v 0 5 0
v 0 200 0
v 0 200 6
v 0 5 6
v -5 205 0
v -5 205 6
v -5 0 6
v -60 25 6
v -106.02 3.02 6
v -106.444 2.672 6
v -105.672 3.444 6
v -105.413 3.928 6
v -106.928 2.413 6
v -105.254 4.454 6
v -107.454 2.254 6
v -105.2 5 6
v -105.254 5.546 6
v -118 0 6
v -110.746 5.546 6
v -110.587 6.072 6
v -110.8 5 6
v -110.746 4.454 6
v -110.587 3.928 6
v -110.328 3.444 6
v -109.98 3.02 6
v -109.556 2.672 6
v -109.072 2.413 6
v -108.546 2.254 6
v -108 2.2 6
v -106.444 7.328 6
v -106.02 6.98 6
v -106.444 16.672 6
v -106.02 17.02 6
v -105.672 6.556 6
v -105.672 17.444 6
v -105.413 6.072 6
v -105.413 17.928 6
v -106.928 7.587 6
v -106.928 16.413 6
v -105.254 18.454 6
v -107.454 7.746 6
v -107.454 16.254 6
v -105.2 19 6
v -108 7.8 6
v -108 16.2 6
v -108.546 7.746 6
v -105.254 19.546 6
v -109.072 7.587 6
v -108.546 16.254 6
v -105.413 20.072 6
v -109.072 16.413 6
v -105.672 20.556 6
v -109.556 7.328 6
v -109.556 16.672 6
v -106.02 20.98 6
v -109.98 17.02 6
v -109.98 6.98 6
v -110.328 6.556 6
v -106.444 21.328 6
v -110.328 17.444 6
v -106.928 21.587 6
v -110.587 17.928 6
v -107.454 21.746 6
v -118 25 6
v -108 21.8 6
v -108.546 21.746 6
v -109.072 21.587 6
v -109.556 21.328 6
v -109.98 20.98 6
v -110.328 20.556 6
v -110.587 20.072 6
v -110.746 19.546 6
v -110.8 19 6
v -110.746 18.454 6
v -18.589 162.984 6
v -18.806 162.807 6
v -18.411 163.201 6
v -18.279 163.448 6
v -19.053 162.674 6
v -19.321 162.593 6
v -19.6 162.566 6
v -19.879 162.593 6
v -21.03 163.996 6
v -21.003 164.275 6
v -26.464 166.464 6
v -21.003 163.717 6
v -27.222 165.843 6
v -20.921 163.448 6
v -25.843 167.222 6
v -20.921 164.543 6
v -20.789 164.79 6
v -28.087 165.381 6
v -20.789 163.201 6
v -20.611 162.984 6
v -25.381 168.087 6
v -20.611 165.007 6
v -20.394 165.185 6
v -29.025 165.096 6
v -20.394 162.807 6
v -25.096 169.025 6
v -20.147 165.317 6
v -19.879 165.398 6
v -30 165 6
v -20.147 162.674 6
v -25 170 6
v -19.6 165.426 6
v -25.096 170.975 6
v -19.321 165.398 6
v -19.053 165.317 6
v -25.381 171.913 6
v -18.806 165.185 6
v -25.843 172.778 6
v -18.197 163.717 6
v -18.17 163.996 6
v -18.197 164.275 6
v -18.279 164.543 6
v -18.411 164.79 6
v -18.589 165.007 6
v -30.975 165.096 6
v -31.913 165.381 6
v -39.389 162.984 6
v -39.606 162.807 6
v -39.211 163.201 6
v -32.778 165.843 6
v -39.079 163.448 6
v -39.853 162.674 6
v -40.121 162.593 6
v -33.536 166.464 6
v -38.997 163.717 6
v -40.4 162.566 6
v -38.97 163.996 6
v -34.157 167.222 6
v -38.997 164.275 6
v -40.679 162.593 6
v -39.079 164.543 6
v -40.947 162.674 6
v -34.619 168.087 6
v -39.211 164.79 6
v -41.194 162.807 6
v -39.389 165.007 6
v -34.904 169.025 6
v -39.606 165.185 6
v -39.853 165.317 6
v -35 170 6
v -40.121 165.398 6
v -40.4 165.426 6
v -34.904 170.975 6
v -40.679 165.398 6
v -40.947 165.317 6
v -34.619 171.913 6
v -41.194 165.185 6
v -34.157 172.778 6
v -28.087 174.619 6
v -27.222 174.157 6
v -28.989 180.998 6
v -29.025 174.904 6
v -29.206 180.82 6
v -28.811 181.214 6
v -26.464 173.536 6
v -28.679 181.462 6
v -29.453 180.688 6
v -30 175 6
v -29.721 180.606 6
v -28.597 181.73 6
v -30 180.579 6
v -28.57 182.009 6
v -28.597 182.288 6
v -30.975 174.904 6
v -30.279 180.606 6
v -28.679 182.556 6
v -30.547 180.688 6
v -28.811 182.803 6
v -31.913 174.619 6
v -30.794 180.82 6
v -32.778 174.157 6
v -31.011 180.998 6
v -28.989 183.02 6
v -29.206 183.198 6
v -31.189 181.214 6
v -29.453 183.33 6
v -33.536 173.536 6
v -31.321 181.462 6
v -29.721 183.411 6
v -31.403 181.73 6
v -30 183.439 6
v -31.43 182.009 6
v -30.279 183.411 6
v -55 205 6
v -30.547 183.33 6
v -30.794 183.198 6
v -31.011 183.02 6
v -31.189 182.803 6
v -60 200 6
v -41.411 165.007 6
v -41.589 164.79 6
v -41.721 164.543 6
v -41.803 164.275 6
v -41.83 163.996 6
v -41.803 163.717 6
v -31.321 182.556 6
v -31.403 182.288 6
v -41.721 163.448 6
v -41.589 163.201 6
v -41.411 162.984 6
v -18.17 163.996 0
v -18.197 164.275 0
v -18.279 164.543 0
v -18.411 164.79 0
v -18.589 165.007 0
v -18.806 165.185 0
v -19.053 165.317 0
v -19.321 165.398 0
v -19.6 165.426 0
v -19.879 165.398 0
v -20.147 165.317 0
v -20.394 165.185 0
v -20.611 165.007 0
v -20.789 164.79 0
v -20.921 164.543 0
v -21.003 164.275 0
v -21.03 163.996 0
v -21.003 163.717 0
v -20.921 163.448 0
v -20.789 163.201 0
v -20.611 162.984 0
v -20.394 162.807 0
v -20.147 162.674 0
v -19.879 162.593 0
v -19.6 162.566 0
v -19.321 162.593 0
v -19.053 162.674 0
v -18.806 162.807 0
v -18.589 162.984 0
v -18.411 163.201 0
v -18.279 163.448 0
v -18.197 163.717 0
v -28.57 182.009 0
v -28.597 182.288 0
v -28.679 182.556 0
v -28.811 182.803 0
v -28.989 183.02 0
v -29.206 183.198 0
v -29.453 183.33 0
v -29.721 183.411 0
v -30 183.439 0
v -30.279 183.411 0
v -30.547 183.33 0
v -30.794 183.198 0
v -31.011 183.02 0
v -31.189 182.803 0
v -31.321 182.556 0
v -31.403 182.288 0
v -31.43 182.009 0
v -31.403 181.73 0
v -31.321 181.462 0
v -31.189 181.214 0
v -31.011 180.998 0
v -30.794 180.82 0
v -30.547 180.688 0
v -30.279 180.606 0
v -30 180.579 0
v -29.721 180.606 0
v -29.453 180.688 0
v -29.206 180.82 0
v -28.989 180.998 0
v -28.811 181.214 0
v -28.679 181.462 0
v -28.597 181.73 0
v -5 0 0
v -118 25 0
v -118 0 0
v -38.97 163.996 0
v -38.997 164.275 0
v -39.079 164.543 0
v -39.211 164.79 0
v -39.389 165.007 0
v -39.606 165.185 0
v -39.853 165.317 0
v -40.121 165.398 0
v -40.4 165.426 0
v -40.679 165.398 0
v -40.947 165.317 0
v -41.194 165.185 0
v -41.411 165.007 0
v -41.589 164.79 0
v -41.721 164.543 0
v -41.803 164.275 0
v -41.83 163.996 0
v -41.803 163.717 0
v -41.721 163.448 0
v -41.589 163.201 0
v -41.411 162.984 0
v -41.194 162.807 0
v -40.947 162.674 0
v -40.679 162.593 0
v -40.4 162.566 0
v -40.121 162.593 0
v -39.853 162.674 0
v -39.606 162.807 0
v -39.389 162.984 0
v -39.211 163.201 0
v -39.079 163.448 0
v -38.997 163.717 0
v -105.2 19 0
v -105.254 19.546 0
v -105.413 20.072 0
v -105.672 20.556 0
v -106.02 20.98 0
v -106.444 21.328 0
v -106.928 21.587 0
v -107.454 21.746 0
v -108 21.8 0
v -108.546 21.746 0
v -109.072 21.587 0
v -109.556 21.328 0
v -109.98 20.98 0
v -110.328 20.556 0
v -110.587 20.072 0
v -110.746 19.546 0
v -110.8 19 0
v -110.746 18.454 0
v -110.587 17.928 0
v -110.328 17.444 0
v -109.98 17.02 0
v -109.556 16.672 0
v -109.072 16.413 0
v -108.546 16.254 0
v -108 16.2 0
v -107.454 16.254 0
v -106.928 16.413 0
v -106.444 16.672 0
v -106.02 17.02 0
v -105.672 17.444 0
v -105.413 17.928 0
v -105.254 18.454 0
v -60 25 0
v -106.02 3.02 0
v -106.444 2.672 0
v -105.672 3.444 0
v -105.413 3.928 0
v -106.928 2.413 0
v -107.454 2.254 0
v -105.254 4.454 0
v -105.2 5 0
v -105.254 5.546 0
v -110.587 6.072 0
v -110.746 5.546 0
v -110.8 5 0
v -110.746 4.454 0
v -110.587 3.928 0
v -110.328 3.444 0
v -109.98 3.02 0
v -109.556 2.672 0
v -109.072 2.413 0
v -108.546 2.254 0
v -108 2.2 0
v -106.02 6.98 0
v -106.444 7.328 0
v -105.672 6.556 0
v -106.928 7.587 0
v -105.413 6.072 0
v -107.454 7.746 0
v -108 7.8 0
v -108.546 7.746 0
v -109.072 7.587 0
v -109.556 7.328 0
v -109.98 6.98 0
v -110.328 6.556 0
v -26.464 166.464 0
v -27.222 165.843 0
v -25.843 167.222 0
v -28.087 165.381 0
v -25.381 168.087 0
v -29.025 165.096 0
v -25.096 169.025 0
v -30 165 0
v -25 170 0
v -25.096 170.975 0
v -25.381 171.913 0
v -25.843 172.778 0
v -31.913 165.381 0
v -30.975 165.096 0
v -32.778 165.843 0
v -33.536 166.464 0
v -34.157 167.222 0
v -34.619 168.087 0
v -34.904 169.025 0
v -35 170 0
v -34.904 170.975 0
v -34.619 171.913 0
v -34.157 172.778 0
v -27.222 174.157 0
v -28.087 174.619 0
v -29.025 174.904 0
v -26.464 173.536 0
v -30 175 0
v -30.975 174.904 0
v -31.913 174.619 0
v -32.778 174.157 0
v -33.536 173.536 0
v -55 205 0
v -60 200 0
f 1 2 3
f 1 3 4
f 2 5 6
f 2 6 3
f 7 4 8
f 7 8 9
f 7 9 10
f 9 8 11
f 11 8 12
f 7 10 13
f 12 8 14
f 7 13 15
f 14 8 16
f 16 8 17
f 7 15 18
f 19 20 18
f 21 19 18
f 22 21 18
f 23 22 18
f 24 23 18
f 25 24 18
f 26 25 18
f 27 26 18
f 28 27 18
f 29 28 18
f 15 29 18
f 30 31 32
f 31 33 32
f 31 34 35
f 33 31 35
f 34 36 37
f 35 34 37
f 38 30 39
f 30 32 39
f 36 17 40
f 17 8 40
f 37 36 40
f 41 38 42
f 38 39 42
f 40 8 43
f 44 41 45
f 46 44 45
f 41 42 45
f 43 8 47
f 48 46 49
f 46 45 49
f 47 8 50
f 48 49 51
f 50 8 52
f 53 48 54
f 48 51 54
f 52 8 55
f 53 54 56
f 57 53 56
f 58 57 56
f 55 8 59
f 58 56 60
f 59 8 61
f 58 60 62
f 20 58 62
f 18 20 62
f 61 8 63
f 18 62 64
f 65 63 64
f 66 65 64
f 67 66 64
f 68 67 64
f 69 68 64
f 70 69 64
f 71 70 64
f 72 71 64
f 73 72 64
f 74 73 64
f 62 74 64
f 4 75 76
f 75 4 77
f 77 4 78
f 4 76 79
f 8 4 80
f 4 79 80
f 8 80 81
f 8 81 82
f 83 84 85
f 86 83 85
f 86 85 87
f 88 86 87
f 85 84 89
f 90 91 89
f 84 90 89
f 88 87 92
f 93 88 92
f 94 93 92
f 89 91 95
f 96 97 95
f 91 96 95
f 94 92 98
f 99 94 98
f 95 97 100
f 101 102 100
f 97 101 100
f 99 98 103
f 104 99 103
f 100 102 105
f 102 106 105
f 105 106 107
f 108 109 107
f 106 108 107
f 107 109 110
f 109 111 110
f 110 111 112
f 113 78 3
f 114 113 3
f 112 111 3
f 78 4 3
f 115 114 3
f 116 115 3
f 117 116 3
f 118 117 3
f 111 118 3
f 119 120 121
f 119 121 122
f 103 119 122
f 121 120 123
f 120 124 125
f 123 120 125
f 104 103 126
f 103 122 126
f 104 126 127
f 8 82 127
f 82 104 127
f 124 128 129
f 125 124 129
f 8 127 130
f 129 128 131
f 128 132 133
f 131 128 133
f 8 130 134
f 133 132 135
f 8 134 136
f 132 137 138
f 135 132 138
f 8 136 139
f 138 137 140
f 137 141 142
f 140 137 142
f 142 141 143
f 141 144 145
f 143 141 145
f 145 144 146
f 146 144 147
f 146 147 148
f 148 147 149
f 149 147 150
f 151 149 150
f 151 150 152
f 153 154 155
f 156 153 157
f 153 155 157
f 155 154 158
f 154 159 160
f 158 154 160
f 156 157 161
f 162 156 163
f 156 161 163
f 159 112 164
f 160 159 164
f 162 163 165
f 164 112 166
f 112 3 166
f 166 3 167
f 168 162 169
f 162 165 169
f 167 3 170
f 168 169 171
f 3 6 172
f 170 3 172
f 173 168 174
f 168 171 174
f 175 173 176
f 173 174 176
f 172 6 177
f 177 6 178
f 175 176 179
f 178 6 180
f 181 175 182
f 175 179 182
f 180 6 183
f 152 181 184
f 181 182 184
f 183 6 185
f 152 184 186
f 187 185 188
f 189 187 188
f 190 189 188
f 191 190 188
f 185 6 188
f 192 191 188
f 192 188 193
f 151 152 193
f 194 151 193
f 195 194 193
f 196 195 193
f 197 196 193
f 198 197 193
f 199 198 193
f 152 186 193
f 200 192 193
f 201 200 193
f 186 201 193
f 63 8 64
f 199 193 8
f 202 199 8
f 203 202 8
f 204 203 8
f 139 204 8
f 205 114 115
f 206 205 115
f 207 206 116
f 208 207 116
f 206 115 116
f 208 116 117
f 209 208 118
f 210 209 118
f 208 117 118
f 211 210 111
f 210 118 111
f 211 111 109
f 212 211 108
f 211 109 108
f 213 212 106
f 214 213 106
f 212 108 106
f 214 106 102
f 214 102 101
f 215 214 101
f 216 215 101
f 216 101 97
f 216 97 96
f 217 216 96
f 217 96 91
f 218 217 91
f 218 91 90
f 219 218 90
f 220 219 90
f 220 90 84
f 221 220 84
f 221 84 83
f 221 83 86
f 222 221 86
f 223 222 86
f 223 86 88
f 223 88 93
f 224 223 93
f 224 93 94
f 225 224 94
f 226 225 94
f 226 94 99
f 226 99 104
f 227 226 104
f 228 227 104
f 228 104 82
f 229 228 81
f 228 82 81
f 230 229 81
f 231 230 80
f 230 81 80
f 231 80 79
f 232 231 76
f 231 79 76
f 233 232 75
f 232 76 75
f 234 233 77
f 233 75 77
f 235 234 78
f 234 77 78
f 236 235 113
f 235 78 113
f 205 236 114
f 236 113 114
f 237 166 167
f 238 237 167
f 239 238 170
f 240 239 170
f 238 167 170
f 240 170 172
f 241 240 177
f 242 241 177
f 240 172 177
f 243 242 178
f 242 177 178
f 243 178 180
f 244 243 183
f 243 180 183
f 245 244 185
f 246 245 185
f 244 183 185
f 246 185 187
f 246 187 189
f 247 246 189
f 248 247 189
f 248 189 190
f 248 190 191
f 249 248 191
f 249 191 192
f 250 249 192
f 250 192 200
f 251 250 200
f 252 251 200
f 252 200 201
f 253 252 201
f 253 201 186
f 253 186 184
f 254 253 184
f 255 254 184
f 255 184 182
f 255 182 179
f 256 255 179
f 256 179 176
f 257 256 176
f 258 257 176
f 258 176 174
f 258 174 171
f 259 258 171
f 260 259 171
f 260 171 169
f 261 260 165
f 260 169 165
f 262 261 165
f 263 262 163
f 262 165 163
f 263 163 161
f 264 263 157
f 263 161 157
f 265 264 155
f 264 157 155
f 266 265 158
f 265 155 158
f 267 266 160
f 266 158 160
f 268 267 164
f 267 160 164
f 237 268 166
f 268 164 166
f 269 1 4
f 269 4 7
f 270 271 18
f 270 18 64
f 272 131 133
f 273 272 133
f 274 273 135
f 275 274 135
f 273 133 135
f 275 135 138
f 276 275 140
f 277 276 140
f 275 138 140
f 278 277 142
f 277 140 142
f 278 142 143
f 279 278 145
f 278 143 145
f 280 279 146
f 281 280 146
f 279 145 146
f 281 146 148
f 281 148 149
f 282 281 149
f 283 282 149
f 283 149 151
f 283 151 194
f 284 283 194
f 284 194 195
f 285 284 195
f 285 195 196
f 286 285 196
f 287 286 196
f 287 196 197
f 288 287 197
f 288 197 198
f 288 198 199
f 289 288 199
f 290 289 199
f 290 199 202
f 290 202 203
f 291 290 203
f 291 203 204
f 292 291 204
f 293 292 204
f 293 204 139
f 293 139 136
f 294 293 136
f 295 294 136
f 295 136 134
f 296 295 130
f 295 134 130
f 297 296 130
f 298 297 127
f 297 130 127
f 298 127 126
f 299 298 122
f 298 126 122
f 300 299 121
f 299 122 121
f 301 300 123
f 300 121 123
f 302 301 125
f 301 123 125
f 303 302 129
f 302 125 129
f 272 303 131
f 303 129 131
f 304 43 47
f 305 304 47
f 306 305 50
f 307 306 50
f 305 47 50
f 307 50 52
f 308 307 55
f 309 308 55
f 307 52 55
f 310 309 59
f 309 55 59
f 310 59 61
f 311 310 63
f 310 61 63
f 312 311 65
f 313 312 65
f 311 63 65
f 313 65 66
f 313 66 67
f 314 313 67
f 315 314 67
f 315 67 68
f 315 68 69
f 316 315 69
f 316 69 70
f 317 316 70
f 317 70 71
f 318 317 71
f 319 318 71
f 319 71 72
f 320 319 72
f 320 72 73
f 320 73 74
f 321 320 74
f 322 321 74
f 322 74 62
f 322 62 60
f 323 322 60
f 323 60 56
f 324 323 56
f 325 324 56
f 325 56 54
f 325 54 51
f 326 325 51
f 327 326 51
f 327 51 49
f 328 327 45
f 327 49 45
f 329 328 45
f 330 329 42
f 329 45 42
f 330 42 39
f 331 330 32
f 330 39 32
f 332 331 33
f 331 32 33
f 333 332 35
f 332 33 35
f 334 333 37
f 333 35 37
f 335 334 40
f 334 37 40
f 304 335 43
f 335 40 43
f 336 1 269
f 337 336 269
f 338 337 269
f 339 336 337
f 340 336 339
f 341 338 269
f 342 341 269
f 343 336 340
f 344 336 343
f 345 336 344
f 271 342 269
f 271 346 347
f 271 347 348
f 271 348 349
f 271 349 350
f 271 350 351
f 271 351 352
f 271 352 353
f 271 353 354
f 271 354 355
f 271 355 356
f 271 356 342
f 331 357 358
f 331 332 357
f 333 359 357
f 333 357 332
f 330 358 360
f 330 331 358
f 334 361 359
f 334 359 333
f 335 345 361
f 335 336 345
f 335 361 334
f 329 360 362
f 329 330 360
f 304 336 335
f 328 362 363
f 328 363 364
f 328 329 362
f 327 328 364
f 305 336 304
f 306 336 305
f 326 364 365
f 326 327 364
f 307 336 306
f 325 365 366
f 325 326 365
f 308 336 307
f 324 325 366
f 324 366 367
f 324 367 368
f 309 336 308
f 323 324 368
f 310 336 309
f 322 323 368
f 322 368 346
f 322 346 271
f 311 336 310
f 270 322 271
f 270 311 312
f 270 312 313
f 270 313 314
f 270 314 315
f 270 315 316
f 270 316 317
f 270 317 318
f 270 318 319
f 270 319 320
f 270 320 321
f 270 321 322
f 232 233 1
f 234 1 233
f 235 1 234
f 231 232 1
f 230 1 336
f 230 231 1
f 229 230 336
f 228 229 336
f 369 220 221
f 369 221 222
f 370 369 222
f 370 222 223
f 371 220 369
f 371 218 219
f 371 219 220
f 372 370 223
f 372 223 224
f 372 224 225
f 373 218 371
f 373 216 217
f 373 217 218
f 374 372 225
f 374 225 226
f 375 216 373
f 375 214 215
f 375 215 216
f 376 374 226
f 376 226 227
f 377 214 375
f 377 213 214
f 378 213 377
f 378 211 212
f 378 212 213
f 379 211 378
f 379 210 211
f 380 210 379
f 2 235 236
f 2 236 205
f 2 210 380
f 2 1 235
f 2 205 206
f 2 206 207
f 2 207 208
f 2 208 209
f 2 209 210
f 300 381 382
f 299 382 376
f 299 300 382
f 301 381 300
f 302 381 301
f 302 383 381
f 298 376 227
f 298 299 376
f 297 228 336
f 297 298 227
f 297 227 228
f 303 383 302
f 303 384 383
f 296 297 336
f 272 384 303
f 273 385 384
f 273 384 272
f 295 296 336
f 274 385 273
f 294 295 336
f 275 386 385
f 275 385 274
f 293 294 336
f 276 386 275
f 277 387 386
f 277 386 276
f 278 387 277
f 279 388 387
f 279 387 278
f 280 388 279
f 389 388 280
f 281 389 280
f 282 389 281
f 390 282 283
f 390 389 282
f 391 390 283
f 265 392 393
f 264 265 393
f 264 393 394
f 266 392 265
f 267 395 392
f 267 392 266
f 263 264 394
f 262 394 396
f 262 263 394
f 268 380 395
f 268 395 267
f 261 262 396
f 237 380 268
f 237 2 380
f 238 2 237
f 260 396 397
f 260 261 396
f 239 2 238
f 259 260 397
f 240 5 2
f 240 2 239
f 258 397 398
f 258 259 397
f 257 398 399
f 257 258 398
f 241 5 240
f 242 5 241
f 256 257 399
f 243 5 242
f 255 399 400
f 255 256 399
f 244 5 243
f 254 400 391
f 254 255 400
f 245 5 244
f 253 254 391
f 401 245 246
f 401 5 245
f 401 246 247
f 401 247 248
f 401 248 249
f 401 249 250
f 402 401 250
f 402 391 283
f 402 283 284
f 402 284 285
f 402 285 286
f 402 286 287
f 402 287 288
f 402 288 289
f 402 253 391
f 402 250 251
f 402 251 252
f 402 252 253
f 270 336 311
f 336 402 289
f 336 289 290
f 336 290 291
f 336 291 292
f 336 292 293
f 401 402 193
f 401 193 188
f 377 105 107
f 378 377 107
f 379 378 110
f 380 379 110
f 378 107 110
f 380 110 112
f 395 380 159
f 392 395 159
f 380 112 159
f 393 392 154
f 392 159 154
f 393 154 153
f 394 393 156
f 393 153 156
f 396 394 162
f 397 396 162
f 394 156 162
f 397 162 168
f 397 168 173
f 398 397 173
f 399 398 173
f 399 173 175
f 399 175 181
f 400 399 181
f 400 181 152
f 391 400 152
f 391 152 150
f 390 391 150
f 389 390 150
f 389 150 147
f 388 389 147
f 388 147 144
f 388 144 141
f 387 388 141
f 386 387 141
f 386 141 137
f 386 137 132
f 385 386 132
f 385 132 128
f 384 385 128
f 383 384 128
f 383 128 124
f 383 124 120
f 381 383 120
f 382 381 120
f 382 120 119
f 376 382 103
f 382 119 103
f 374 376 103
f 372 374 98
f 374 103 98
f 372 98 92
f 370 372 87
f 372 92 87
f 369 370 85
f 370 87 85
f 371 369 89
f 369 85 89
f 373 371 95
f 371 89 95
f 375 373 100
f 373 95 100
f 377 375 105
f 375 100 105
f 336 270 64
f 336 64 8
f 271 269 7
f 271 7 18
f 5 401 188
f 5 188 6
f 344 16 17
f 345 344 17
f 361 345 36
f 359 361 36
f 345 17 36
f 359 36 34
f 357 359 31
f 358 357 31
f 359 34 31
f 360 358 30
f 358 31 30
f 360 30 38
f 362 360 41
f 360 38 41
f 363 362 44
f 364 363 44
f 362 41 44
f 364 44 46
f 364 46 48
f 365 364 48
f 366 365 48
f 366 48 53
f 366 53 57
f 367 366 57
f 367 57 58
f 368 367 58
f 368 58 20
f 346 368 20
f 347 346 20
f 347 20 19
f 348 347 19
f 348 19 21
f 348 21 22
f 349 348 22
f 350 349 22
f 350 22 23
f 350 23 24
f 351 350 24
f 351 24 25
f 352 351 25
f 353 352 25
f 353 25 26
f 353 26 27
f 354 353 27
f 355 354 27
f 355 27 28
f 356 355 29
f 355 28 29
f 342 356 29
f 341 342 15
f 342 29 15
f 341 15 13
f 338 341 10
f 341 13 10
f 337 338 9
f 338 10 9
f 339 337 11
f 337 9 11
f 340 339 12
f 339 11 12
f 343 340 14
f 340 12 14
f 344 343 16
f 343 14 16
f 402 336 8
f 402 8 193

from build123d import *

# Parameters (mm, degrees)
BOSS_EXTRUDE1_DEPTH = 6
SKETCH2_R           = 2.8
SKETCH2_R_2         = 5
SKETCH2_R_3         = 1.43
CUT_EXTRUDE1_DEPTH  = 7


with BuildPart() as part:
    # Sketch1 → Boss-Extrude1 (new body)
    with BuildSketch(Plane.XY):
        Polygon((0, 200), (0, 5), (-5, 0), (-118, 0), (-118, 25), (-60, 25), (-60, 200), (-55, 205), (-5, 205), align=None)
    extrude(amount=BOSS_EXTRUDE1_DEPTH)

    # Sketch2 → Cut-Extrude1 (cut, through all)
    with BuildSketch(Plane.XY.offset(6)):
        with Locations((-108, 19)):
            Circle(SKETCH2_R)
        with Locations((-108, 5)):
            Circle(SKETCH2_R)
        with Locations((-30, 170)):
            Circle(SKETCH2_R_2)
        with Locations((-19.6, 163.9955572)):
            Circle(SKETCH2_R_3)
        with Locations((-40.4, 163.9955572)):
            Circle(SKETCH2_R_3)
        with Locations((-30, 182.008885599)):
            Circle(SKETCH2_R_3)
    extrude(amount=-CUT_EXTRUDE1_DEPTH, mode=Mode.SUBTRACT)


solid = part.part
